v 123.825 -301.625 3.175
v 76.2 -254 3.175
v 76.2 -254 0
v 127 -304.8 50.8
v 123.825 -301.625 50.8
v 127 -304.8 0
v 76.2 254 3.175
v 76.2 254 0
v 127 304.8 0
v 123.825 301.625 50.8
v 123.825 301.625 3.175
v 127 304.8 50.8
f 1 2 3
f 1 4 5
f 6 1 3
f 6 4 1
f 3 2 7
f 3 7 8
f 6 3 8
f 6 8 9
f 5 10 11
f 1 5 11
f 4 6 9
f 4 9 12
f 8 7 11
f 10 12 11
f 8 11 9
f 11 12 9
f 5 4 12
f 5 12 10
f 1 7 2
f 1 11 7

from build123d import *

# Parameters (mm, degrees)
F1_DEPTH = 304.8
F2_SIZE  = 50.79999
F3_SIZE  = 50.79999


# Not quite as in the source:
# - a fillet or chamfer is up to 0.001 mm smaller than in the source, because OpenCascade refuses the exact size


with BuildPart() as f1:
    # F0 (on Front) → F1 (new body, symmetric)
    with BuildSketch(Plane.XZ):
        Polygon((76.2, 3.175), (76.2, 0), (127, 0), (127, 50.8), (123.825, 50.8), (123.825, 3.175), align=None)
    extrude(amount=F1_DEPTH, both=True)

    # F2 (size 50.8 in the source; OpenCascade refuses exactly that, so slightly less here)
    f2_edges = [f1.edges().sort_by_distance(p)[0] for p in [
        (76.2, -304.8, 1.5875),
    ]]
    chamfer(f2_edges, length=F2_SIZE)

    # F3 (size 50.8 in the source; OpenCascade refuses exactly that, so slightly less here)
    f3_edges = [f1.edges().sort_by_distance(p)[0] for p in [
        (76.2, 304.8, 1.5875),
    ]]
    chamfer(f3_edges, length=F3_SIZE)


solid = f1.part
